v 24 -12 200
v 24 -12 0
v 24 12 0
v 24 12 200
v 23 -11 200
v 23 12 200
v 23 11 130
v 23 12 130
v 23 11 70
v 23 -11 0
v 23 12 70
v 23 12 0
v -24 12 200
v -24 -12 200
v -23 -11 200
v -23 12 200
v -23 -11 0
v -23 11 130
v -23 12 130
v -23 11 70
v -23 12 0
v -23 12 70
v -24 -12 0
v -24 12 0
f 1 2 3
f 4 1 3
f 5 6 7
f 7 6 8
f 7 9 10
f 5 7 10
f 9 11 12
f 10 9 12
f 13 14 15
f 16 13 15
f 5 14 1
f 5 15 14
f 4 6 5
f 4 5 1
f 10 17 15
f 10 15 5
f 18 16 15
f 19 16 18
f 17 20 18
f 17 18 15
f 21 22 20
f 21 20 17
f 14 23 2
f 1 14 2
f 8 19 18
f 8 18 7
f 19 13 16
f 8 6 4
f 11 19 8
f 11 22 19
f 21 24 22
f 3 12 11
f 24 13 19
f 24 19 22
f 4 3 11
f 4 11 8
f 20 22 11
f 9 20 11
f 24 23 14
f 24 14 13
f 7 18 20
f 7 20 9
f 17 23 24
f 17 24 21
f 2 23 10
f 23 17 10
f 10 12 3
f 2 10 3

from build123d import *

# Parameters (mm, degrees)
SKETCH1_W           = 48
SKETCH1_H           = 24
SKETCH1_W_2         = 46
SKETCH1_H_2         = 22
BOSS_EXTRUDE1_DEPTH = 200
SKETCH2_W           = 46
SKETCH2_H           = 70
CUT_EXTRUDE1_DEPTH  = 23


with BuildPart() as part:
    # Sketch1 → Boss-Extrude1 (new body)
    with BuildSketch(Plane.XY):
        Rectangle(SKETCH1_W, SKETCH1_H)
        Rectangle(SKETCH1_W_2, SKETCH1_H_2, mode=Mode.SUBTRACT)
    extrude(amount=BOSS_EXTRUDE1_DEPTH)

    # Sketch2 → Cut-Extrude1 (cut)
    with BuildSketch(Plane(origin=(0, 12, 0), x_dir=(1, 0, 0), z_dir=(0, 1, 0))):
        with Locations((0, -165)):
            Rectangle(SKETCH2_W, SKETCH2_H)
        with Locations((0, -35)):
            Rectangle(SKETCH2_W, SKETCH2_H)
    extrude(amount=-CUT_EXTRUDE1_DEPTH, mode=Mode.SUBTRACT)


solid = part.part
